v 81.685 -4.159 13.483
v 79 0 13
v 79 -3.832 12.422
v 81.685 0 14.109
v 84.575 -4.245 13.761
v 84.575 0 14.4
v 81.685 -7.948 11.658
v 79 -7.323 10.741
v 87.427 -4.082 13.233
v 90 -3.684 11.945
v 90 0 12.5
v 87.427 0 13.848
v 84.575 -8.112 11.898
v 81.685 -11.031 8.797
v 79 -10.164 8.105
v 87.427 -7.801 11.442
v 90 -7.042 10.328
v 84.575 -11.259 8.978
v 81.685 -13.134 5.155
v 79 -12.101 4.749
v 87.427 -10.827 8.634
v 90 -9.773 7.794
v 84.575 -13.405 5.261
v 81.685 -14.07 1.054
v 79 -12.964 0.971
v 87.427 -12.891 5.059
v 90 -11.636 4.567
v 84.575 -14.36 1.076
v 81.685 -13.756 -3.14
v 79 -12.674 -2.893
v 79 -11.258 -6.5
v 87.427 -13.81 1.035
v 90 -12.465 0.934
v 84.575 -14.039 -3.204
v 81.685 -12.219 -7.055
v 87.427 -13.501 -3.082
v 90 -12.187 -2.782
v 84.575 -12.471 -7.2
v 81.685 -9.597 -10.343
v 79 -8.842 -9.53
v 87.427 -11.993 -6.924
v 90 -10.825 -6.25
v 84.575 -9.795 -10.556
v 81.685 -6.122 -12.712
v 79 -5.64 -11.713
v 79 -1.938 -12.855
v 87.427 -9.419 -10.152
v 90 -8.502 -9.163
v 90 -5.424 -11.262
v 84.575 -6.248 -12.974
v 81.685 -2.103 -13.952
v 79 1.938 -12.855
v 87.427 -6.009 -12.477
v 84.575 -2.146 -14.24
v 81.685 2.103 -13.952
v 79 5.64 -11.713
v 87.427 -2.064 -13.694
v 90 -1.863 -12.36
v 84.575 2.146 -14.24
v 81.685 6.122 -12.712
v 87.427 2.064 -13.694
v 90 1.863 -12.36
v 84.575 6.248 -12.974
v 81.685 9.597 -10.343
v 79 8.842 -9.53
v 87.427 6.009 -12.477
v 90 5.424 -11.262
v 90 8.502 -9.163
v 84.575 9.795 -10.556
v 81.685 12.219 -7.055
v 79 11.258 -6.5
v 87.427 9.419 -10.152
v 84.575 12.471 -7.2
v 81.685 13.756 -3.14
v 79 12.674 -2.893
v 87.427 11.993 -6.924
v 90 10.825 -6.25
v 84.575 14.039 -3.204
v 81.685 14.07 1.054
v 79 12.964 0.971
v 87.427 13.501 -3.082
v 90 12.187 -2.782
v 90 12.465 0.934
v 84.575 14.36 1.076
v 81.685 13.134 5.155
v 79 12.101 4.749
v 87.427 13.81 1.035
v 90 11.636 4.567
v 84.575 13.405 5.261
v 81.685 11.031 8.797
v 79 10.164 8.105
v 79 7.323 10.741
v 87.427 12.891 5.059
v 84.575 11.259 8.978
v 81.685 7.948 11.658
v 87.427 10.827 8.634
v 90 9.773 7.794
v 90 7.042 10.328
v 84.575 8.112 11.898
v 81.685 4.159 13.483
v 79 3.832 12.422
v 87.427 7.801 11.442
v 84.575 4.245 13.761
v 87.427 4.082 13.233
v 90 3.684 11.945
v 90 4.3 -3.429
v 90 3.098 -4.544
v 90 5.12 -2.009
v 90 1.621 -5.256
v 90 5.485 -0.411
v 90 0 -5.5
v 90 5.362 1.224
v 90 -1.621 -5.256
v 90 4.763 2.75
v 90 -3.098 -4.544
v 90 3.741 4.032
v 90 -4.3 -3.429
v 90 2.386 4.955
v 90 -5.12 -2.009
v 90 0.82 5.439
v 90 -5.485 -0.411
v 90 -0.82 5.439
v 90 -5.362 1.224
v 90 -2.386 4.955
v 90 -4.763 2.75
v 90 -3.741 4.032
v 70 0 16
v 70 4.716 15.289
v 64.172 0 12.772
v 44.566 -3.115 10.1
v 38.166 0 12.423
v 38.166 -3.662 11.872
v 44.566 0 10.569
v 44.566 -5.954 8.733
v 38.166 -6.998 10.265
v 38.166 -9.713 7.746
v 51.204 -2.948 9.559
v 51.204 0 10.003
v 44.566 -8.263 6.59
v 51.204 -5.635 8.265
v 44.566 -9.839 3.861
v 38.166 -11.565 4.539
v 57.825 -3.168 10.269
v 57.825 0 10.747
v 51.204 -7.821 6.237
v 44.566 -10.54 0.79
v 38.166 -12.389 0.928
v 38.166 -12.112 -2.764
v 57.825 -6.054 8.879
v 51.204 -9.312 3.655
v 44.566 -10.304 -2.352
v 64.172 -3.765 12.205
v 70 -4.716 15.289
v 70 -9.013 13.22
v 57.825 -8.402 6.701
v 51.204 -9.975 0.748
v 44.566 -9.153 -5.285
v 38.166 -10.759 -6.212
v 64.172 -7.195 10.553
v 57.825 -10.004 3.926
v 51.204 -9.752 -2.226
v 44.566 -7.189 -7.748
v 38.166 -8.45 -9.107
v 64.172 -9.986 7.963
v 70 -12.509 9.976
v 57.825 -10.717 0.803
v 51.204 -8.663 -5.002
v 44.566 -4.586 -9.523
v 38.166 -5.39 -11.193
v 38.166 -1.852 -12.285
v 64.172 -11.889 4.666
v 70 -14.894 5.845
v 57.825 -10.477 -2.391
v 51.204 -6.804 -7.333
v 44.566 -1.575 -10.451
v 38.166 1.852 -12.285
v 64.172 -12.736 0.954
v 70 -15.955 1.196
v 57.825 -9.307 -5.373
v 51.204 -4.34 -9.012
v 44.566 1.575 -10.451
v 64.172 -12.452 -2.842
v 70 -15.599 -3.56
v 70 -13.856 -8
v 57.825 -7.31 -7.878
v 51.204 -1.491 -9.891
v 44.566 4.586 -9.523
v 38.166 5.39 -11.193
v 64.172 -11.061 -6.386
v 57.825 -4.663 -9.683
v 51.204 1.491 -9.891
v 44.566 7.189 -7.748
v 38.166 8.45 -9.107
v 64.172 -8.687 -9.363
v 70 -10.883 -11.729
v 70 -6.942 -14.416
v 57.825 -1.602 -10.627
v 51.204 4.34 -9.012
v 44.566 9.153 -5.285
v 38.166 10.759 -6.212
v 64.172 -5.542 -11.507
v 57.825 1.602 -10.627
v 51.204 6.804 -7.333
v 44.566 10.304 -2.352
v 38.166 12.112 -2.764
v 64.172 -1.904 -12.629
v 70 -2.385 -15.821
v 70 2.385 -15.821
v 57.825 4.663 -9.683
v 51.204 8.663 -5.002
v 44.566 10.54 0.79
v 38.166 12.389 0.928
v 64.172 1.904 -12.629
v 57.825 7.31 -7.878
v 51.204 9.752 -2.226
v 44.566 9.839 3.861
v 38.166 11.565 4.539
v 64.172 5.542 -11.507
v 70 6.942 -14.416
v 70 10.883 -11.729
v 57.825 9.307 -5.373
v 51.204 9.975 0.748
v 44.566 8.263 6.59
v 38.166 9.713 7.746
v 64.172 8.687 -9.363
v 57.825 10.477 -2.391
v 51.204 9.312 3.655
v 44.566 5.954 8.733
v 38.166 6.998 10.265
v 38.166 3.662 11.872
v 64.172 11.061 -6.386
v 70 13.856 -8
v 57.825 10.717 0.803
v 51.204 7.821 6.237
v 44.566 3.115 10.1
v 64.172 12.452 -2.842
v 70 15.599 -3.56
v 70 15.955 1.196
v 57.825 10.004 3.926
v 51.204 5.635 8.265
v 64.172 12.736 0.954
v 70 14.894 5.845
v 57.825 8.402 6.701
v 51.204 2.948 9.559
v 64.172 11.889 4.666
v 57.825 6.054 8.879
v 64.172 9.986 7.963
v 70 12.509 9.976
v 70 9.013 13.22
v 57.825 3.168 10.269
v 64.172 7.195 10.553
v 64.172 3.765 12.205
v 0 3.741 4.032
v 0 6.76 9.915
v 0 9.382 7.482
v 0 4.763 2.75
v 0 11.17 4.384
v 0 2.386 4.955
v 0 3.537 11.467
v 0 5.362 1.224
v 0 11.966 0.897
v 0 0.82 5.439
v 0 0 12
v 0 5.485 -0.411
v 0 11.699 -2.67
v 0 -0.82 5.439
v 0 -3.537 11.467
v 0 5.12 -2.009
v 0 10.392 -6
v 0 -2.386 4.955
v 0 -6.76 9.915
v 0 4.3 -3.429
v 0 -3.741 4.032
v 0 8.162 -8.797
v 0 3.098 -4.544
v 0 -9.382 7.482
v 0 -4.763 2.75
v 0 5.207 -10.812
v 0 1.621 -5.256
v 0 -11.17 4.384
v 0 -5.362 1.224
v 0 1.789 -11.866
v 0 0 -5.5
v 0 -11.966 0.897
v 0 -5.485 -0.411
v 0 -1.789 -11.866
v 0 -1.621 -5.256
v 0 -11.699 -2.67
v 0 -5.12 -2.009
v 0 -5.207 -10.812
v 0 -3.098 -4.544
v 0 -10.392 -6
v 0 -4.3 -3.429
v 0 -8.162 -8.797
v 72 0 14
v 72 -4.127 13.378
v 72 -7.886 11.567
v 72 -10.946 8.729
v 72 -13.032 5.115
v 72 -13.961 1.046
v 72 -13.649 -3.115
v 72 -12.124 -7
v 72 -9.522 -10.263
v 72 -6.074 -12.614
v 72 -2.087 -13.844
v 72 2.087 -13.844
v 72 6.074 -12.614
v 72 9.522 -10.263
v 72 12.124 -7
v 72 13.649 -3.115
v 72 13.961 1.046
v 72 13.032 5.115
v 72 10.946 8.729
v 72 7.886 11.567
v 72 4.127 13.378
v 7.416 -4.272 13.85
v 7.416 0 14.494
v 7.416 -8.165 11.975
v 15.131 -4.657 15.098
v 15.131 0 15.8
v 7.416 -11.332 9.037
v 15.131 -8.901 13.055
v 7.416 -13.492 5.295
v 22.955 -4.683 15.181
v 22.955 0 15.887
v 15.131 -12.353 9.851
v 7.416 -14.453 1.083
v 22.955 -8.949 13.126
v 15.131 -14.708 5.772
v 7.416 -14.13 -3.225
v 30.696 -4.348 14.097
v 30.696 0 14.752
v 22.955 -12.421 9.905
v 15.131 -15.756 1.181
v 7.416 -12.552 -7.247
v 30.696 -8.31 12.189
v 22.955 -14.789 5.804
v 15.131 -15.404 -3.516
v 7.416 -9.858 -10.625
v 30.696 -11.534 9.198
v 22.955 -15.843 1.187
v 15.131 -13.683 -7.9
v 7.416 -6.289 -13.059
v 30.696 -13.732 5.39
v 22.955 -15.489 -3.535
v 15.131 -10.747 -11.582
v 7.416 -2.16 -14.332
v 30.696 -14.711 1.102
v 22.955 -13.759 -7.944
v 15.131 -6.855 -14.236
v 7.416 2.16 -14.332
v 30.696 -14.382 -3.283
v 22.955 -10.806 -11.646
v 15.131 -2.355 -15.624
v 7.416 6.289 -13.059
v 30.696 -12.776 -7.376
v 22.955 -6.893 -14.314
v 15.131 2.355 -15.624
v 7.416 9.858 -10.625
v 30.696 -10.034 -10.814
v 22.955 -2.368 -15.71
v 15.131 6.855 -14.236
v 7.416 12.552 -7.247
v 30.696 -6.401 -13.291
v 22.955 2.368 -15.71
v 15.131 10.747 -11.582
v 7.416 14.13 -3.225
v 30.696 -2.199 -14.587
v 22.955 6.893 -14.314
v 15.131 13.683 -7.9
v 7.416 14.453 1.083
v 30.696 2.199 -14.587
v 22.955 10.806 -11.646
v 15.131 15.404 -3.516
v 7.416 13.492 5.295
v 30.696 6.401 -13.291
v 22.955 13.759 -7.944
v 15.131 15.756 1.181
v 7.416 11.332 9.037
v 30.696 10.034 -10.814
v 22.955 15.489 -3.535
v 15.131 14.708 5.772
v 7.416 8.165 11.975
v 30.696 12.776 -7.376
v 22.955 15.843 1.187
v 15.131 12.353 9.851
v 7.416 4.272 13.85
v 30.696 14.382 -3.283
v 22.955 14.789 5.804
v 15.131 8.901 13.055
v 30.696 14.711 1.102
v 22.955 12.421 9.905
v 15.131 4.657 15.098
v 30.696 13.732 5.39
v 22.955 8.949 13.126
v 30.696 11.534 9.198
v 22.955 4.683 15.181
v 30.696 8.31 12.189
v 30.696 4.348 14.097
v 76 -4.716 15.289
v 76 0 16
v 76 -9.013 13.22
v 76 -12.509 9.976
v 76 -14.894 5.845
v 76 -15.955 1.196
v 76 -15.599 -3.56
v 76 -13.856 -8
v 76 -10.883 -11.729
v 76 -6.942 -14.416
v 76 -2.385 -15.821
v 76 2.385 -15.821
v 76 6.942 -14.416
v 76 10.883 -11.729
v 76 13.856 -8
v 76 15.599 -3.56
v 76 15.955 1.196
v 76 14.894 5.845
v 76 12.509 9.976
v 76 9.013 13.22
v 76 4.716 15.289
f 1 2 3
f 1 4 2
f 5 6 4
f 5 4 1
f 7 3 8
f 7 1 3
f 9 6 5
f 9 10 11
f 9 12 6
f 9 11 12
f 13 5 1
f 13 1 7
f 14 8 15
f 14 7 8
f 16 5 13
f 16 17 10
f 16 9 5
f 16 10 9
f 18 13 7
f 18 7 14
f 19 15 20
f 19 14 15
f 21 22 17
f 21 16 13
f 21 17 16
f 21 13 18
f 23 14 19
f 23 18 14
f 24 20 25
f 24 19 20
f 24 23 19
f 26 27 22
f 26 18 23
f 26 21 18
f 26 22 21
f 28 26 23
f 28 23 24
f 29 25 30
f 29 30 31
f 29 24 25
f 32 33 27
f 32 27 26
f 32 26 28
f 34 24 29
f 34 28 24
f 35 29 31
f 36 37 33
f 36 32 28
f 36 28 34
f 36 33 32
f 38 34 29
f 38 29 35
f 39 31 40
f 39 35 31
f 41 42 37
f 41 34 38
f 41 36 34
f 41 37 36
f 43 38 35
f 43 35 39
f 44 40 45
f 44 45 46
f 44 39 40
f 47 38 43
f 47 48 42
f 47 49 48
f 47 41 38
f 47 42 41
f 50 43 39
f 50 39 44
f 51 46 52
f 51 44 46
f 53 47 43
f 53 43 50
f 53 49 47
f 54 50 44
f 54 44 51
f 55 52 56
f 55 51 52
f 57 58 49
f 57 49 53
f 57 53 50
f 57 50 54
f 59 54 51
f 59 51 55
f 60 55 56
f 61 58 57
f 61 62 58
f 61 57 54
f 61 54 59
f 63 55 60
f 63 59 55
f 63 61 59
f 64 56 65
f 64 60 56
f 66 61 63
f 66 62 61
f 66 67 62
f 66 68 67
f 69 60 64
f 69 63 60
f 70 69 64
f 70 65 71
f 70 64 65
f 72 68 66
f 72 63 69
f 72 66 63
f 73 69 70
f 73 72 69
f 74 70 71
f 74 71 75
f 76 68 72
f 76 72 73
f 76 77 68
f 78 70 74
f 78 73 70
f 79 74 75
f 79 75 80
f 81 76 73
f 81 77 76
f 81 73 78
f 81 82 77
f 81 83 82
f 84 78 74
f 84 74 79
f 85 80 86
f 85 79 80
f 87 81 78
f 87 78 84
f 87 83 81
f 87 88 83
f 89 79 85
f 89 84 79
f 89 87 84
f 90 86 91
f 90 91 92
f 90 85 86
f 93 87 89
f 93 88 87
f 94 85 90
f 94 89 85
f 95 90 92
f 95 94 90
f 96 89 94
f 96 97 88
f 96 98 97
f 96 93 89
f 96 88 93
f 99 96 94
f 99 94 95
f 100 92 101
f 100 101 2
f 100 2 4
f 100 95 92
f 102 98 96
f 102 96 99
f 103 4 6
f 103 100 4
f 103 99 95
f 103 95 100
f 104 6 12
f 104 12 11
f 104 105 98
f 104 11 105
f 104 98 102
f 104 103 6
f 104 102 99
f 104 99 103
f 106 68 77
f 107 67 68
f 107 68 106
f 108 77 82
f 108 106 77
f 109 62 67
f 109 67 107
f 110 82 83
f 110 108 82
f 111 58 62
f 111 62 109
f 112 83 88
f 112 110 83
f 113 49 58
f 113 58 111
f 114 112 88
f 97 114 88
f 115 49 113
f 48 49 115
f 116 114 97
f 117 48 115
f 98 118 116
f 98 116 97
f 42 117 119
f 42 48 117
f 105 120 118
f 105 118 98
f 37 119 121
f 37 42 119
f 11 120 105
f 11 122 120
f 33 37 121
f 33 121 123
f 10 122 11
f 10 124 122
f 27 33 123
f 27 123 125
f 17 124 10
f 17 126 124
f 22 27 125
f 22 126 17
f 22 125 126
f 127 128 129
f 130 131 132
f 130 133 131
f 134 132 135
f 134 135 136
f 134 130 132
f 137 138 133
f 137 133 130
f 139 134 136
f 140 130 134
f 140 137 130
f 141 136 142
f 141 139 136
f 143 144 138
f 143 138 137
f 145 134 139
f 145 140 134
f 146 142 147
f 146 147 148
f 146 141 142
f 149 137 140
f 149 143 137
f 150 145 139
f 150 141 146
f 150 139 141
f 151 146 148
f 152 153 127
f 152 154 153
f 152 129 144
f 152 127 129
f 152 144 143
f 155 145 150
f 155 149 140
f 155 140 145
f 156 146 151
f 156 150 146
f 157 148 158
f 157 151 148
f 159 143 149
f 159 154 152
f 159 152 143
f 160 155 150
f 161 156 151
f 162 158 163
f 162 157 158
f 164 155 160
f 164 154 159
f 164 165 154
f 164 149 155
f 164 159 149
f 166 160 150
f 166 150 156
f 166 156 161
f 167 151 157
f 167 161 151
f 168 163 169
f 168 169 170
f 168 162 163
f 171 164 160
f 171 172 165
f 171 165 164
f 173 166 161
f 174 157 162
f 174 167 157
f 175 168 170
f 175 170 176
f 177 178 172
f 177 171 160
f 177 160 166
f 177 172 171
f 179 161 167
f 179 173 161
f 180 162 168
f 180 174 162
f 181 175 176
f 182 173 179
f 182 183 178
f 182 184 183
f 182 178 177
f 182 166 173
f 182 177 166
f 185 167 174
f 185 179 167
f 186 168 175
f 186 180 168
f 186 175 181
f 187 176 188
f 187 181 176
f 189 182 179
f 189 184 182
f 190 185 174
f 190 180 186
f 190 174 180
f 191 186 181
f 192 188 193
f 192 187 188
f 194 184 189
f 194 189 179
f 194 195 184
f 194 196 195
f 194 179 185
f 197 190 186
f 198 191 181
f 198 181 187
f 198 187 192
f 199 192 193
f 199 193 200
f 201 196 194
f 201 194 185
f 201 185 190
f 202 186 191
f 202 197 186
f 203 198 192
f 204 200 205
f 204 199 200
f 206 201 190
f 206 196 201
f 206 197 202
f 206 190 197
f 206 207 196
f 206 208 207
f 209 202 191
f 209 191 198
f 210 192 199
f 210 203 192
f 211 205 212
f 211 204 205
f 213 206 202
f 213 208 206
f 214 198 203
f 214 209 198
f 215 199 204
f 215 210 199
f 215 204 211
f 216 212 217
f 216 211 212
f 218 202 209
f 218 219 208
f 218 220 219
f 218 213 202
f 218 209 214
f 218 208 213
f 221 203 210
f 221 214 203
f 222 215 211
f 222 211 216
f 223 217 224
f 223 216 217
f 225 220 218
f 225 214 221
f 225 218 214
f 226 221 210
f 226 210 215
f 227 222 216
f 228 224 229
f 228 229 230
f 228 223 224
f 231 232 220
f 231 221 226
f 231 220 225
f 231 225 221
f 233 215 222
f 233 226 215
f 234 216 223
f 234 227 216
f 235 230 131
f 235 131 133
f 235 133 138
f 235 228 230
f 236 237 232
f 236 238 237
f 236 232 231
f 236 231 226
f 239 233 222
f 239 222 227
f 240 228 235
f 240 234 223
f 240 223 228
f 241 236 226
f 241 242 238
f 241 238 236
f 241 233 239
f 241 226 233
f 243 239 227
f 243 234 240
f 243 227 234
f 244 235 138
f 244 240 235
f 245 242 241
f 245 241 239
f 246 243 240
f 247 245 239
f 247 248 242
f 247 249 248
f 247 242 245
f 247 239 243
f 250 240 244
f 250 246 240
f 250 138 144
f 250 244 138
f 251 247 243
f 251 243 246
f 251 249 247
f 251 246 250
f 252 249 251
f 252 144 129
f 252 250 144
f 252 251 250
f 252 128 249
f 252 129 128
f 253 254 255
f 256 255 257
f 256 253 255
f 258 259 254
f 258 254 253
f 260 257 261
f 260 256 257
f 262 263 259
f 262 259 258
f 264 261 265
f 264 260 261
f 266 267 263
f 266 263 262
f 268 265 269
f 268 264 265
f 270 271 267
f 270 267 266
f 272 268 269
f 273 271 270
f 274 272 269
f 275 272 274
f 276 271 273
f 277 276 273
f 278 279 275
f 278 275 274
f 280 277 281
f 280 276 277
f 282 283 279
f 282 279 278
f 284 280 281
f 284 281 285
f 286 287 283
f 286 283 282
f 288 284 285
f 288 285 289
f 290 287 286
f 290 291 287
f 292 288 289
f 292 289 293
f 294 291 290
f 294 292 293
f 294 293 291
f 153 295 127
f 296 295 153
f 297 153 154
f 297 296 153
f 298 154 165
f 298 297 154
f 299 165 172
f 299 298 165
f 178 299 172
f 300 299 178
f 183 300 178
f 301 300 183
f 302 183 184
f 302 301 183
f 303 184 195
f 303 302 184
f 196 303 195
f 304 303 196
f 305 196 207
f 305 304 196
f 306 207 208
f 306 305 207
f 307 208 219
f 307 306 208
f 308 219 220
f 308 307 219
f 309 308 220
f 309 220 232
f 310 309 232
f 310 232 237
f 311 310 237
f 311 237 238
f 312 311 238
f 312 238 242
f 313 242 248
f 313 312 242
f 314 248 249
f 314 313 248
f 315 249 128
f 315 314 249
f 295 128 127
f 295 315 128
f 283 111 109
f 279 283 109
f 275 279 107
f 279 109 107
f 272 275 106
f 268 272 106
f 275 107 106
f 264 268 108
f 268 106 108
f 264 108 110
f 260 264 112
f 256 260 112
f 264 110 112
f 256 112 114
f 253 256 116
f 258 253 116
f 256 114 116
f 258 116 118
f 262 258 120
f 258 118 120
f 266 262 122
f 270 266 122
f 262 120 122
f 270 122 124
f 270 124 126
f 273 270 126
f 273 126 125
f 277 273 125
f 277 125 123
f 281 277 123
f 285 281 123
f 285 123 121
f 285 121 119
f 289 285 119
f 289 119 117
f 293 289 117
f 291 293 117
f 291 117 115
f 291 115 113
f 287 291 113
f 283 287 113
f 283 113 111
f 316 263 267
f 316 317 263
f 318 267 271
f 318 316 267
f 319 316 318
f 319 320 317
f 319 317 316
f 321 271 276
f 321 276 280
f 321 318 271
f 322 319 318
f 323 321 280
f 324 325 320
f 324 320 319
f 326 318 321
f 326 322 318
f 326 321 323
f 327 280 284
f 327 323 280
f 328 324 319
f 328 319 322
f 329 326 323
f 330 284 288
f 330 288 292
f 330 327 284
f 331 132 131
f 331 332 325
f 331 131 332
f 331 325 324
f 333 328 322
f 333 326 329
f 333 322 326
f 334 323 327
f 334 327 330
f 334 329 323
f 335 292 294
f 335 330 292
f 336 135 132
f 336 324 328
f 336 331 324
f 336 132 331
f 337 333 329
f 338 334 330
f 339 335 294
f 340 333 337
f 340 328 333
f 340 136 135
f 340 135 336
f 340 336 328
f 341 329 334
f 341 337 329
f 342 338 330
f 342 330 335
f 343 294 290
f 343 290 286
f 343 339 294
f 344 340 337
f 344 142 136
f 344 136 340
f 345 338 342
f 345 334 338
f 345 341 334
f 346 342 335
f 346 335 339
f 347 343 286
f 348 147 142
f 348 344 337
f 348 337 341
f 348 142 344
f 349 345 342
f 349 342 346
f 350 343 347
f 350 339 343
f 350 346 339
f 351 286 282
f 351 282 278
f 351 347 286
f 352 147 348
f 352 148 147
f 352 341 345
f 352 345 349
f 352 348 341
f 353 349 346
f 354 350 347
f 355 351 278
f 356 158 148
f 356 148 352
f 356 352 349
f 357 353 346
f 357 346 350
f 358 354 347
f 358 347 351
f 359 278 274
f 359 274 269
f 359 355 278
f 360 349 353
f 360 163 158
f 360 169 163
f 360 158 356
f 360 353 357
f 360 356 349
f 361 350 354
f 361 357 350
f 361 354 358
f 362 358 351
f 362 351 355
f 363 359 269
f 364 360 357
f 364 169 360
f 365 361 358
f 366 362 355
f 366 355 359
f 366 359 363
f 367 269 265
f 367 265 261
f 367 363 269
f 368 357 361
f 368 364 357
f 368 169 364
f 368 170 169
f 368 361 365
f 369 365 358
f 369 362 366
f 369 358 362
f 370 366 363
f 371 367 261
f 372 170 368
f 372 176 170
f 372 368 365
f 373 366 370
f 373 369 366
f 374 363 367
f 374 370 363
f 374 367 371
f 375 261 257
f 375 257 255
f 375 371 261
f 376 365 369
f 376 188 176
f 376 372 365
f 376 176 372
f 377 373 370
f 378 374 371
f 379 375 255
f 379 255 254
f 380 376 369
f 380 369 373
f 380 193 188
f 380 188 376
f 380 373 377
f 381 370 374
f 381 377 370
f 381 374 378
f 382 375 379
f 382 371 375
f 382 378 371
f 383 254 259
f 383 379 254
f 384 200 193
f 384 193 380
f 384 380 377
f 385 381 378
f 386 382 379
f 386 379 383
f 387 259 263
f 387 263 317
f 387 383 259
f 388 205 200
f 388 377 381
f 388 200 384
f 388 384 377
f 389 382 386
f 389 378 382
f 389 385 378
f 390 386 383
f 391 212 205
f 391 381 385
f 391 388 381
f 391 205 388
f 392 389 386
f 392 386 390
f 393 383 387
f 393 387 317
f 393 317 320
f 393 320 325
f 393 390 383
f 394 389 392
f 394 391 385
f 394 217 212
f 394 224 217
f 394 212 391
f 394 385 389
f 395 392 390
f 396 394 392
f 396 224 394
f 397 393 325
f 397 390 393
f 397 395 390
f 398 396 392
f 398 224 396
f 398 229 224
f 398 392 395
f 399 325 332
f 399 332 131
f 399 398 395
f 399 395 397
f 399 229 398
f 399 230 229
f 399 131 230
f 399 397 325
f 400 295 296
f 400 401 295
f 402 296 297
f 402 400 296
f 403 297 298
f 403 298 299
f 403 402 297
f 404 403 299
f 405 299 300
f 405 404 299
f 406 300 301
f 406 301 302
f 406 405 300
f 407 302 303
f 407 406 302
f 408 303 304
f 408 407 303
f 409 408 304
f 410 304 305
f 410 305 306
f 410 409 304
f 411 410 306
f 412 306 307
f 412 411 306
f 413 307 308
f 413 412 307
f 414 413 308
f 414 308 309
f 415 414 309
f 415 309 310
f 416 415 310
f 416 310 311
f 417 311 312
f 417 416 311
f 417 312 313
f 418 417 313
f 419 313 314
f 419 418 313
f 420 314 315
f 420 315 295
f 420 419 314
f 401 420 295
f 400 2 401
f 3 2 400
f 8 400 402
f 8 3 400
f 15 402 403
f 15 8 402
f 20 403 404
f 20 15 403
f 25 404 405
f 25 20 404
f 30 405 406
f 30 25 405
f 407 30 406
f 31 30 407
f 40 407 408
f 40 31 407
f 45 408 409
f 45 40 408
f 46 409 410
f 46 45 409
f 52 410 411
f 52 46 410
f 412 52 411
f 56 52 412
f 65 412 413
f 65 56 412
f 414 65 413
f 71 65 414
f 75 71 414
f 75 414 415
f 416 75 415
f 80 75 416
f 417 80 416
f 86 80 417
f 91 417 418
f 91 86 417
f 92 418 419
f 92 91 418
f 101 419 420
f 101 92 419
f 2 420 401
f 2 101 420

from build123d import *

# Parameters (mm, degrees)
SKETCH_2_R          = 5.5
CUT_EXTRUDE_1_DEPTH = 93.800862196


with BuildPart() as part:
    # 草图1 → 旋转1 (revolve)
    with BuildSketch(Plane.XY, mode=Mode.PRIVATE) as revolve_1_sk:
        with BuildLine():
            Line((0, 0), (0, 12))
            ThreePointArc((0, 12), (19.041155999, 15.996922297), (38.166312057, 12.423490416))
            ThreePointArc((38.166312057, 12.423490416), (54.532546306, 10.211825865), (70, 16))
            Line((70, 16), (72, 14))
            Line((72, 14), (76, 16))
            Line((76, 16), (79, 13))
            ThreePointArc((79, 13), (84.575017818, 14.400392001), (90, 12.5))
            Line((90, 12.5), (90, 0))
            Line((90, 0), (0, 0))
        make_face()
    revolve(revolve_1_sk.sketch.rotate(Axis((0, 0, 0), (1, 0, 0)), 90), axis=Axis((0, 0, 0), (1, 0, 0)))

    # 草图2 → 切除-拉伸1 (cut, through all)
    with BuildSketch(Plane(origin=(90, 0, 0), x_dir=(0, 0, -1), z_dir=(1, 0, 0))):
        Circle(SKETCH_2_R)
    extrude(amount=-CUT_EXTRUDE_1_DEPTH, mode=Mode.SUBTRACT)


solid = part.part
